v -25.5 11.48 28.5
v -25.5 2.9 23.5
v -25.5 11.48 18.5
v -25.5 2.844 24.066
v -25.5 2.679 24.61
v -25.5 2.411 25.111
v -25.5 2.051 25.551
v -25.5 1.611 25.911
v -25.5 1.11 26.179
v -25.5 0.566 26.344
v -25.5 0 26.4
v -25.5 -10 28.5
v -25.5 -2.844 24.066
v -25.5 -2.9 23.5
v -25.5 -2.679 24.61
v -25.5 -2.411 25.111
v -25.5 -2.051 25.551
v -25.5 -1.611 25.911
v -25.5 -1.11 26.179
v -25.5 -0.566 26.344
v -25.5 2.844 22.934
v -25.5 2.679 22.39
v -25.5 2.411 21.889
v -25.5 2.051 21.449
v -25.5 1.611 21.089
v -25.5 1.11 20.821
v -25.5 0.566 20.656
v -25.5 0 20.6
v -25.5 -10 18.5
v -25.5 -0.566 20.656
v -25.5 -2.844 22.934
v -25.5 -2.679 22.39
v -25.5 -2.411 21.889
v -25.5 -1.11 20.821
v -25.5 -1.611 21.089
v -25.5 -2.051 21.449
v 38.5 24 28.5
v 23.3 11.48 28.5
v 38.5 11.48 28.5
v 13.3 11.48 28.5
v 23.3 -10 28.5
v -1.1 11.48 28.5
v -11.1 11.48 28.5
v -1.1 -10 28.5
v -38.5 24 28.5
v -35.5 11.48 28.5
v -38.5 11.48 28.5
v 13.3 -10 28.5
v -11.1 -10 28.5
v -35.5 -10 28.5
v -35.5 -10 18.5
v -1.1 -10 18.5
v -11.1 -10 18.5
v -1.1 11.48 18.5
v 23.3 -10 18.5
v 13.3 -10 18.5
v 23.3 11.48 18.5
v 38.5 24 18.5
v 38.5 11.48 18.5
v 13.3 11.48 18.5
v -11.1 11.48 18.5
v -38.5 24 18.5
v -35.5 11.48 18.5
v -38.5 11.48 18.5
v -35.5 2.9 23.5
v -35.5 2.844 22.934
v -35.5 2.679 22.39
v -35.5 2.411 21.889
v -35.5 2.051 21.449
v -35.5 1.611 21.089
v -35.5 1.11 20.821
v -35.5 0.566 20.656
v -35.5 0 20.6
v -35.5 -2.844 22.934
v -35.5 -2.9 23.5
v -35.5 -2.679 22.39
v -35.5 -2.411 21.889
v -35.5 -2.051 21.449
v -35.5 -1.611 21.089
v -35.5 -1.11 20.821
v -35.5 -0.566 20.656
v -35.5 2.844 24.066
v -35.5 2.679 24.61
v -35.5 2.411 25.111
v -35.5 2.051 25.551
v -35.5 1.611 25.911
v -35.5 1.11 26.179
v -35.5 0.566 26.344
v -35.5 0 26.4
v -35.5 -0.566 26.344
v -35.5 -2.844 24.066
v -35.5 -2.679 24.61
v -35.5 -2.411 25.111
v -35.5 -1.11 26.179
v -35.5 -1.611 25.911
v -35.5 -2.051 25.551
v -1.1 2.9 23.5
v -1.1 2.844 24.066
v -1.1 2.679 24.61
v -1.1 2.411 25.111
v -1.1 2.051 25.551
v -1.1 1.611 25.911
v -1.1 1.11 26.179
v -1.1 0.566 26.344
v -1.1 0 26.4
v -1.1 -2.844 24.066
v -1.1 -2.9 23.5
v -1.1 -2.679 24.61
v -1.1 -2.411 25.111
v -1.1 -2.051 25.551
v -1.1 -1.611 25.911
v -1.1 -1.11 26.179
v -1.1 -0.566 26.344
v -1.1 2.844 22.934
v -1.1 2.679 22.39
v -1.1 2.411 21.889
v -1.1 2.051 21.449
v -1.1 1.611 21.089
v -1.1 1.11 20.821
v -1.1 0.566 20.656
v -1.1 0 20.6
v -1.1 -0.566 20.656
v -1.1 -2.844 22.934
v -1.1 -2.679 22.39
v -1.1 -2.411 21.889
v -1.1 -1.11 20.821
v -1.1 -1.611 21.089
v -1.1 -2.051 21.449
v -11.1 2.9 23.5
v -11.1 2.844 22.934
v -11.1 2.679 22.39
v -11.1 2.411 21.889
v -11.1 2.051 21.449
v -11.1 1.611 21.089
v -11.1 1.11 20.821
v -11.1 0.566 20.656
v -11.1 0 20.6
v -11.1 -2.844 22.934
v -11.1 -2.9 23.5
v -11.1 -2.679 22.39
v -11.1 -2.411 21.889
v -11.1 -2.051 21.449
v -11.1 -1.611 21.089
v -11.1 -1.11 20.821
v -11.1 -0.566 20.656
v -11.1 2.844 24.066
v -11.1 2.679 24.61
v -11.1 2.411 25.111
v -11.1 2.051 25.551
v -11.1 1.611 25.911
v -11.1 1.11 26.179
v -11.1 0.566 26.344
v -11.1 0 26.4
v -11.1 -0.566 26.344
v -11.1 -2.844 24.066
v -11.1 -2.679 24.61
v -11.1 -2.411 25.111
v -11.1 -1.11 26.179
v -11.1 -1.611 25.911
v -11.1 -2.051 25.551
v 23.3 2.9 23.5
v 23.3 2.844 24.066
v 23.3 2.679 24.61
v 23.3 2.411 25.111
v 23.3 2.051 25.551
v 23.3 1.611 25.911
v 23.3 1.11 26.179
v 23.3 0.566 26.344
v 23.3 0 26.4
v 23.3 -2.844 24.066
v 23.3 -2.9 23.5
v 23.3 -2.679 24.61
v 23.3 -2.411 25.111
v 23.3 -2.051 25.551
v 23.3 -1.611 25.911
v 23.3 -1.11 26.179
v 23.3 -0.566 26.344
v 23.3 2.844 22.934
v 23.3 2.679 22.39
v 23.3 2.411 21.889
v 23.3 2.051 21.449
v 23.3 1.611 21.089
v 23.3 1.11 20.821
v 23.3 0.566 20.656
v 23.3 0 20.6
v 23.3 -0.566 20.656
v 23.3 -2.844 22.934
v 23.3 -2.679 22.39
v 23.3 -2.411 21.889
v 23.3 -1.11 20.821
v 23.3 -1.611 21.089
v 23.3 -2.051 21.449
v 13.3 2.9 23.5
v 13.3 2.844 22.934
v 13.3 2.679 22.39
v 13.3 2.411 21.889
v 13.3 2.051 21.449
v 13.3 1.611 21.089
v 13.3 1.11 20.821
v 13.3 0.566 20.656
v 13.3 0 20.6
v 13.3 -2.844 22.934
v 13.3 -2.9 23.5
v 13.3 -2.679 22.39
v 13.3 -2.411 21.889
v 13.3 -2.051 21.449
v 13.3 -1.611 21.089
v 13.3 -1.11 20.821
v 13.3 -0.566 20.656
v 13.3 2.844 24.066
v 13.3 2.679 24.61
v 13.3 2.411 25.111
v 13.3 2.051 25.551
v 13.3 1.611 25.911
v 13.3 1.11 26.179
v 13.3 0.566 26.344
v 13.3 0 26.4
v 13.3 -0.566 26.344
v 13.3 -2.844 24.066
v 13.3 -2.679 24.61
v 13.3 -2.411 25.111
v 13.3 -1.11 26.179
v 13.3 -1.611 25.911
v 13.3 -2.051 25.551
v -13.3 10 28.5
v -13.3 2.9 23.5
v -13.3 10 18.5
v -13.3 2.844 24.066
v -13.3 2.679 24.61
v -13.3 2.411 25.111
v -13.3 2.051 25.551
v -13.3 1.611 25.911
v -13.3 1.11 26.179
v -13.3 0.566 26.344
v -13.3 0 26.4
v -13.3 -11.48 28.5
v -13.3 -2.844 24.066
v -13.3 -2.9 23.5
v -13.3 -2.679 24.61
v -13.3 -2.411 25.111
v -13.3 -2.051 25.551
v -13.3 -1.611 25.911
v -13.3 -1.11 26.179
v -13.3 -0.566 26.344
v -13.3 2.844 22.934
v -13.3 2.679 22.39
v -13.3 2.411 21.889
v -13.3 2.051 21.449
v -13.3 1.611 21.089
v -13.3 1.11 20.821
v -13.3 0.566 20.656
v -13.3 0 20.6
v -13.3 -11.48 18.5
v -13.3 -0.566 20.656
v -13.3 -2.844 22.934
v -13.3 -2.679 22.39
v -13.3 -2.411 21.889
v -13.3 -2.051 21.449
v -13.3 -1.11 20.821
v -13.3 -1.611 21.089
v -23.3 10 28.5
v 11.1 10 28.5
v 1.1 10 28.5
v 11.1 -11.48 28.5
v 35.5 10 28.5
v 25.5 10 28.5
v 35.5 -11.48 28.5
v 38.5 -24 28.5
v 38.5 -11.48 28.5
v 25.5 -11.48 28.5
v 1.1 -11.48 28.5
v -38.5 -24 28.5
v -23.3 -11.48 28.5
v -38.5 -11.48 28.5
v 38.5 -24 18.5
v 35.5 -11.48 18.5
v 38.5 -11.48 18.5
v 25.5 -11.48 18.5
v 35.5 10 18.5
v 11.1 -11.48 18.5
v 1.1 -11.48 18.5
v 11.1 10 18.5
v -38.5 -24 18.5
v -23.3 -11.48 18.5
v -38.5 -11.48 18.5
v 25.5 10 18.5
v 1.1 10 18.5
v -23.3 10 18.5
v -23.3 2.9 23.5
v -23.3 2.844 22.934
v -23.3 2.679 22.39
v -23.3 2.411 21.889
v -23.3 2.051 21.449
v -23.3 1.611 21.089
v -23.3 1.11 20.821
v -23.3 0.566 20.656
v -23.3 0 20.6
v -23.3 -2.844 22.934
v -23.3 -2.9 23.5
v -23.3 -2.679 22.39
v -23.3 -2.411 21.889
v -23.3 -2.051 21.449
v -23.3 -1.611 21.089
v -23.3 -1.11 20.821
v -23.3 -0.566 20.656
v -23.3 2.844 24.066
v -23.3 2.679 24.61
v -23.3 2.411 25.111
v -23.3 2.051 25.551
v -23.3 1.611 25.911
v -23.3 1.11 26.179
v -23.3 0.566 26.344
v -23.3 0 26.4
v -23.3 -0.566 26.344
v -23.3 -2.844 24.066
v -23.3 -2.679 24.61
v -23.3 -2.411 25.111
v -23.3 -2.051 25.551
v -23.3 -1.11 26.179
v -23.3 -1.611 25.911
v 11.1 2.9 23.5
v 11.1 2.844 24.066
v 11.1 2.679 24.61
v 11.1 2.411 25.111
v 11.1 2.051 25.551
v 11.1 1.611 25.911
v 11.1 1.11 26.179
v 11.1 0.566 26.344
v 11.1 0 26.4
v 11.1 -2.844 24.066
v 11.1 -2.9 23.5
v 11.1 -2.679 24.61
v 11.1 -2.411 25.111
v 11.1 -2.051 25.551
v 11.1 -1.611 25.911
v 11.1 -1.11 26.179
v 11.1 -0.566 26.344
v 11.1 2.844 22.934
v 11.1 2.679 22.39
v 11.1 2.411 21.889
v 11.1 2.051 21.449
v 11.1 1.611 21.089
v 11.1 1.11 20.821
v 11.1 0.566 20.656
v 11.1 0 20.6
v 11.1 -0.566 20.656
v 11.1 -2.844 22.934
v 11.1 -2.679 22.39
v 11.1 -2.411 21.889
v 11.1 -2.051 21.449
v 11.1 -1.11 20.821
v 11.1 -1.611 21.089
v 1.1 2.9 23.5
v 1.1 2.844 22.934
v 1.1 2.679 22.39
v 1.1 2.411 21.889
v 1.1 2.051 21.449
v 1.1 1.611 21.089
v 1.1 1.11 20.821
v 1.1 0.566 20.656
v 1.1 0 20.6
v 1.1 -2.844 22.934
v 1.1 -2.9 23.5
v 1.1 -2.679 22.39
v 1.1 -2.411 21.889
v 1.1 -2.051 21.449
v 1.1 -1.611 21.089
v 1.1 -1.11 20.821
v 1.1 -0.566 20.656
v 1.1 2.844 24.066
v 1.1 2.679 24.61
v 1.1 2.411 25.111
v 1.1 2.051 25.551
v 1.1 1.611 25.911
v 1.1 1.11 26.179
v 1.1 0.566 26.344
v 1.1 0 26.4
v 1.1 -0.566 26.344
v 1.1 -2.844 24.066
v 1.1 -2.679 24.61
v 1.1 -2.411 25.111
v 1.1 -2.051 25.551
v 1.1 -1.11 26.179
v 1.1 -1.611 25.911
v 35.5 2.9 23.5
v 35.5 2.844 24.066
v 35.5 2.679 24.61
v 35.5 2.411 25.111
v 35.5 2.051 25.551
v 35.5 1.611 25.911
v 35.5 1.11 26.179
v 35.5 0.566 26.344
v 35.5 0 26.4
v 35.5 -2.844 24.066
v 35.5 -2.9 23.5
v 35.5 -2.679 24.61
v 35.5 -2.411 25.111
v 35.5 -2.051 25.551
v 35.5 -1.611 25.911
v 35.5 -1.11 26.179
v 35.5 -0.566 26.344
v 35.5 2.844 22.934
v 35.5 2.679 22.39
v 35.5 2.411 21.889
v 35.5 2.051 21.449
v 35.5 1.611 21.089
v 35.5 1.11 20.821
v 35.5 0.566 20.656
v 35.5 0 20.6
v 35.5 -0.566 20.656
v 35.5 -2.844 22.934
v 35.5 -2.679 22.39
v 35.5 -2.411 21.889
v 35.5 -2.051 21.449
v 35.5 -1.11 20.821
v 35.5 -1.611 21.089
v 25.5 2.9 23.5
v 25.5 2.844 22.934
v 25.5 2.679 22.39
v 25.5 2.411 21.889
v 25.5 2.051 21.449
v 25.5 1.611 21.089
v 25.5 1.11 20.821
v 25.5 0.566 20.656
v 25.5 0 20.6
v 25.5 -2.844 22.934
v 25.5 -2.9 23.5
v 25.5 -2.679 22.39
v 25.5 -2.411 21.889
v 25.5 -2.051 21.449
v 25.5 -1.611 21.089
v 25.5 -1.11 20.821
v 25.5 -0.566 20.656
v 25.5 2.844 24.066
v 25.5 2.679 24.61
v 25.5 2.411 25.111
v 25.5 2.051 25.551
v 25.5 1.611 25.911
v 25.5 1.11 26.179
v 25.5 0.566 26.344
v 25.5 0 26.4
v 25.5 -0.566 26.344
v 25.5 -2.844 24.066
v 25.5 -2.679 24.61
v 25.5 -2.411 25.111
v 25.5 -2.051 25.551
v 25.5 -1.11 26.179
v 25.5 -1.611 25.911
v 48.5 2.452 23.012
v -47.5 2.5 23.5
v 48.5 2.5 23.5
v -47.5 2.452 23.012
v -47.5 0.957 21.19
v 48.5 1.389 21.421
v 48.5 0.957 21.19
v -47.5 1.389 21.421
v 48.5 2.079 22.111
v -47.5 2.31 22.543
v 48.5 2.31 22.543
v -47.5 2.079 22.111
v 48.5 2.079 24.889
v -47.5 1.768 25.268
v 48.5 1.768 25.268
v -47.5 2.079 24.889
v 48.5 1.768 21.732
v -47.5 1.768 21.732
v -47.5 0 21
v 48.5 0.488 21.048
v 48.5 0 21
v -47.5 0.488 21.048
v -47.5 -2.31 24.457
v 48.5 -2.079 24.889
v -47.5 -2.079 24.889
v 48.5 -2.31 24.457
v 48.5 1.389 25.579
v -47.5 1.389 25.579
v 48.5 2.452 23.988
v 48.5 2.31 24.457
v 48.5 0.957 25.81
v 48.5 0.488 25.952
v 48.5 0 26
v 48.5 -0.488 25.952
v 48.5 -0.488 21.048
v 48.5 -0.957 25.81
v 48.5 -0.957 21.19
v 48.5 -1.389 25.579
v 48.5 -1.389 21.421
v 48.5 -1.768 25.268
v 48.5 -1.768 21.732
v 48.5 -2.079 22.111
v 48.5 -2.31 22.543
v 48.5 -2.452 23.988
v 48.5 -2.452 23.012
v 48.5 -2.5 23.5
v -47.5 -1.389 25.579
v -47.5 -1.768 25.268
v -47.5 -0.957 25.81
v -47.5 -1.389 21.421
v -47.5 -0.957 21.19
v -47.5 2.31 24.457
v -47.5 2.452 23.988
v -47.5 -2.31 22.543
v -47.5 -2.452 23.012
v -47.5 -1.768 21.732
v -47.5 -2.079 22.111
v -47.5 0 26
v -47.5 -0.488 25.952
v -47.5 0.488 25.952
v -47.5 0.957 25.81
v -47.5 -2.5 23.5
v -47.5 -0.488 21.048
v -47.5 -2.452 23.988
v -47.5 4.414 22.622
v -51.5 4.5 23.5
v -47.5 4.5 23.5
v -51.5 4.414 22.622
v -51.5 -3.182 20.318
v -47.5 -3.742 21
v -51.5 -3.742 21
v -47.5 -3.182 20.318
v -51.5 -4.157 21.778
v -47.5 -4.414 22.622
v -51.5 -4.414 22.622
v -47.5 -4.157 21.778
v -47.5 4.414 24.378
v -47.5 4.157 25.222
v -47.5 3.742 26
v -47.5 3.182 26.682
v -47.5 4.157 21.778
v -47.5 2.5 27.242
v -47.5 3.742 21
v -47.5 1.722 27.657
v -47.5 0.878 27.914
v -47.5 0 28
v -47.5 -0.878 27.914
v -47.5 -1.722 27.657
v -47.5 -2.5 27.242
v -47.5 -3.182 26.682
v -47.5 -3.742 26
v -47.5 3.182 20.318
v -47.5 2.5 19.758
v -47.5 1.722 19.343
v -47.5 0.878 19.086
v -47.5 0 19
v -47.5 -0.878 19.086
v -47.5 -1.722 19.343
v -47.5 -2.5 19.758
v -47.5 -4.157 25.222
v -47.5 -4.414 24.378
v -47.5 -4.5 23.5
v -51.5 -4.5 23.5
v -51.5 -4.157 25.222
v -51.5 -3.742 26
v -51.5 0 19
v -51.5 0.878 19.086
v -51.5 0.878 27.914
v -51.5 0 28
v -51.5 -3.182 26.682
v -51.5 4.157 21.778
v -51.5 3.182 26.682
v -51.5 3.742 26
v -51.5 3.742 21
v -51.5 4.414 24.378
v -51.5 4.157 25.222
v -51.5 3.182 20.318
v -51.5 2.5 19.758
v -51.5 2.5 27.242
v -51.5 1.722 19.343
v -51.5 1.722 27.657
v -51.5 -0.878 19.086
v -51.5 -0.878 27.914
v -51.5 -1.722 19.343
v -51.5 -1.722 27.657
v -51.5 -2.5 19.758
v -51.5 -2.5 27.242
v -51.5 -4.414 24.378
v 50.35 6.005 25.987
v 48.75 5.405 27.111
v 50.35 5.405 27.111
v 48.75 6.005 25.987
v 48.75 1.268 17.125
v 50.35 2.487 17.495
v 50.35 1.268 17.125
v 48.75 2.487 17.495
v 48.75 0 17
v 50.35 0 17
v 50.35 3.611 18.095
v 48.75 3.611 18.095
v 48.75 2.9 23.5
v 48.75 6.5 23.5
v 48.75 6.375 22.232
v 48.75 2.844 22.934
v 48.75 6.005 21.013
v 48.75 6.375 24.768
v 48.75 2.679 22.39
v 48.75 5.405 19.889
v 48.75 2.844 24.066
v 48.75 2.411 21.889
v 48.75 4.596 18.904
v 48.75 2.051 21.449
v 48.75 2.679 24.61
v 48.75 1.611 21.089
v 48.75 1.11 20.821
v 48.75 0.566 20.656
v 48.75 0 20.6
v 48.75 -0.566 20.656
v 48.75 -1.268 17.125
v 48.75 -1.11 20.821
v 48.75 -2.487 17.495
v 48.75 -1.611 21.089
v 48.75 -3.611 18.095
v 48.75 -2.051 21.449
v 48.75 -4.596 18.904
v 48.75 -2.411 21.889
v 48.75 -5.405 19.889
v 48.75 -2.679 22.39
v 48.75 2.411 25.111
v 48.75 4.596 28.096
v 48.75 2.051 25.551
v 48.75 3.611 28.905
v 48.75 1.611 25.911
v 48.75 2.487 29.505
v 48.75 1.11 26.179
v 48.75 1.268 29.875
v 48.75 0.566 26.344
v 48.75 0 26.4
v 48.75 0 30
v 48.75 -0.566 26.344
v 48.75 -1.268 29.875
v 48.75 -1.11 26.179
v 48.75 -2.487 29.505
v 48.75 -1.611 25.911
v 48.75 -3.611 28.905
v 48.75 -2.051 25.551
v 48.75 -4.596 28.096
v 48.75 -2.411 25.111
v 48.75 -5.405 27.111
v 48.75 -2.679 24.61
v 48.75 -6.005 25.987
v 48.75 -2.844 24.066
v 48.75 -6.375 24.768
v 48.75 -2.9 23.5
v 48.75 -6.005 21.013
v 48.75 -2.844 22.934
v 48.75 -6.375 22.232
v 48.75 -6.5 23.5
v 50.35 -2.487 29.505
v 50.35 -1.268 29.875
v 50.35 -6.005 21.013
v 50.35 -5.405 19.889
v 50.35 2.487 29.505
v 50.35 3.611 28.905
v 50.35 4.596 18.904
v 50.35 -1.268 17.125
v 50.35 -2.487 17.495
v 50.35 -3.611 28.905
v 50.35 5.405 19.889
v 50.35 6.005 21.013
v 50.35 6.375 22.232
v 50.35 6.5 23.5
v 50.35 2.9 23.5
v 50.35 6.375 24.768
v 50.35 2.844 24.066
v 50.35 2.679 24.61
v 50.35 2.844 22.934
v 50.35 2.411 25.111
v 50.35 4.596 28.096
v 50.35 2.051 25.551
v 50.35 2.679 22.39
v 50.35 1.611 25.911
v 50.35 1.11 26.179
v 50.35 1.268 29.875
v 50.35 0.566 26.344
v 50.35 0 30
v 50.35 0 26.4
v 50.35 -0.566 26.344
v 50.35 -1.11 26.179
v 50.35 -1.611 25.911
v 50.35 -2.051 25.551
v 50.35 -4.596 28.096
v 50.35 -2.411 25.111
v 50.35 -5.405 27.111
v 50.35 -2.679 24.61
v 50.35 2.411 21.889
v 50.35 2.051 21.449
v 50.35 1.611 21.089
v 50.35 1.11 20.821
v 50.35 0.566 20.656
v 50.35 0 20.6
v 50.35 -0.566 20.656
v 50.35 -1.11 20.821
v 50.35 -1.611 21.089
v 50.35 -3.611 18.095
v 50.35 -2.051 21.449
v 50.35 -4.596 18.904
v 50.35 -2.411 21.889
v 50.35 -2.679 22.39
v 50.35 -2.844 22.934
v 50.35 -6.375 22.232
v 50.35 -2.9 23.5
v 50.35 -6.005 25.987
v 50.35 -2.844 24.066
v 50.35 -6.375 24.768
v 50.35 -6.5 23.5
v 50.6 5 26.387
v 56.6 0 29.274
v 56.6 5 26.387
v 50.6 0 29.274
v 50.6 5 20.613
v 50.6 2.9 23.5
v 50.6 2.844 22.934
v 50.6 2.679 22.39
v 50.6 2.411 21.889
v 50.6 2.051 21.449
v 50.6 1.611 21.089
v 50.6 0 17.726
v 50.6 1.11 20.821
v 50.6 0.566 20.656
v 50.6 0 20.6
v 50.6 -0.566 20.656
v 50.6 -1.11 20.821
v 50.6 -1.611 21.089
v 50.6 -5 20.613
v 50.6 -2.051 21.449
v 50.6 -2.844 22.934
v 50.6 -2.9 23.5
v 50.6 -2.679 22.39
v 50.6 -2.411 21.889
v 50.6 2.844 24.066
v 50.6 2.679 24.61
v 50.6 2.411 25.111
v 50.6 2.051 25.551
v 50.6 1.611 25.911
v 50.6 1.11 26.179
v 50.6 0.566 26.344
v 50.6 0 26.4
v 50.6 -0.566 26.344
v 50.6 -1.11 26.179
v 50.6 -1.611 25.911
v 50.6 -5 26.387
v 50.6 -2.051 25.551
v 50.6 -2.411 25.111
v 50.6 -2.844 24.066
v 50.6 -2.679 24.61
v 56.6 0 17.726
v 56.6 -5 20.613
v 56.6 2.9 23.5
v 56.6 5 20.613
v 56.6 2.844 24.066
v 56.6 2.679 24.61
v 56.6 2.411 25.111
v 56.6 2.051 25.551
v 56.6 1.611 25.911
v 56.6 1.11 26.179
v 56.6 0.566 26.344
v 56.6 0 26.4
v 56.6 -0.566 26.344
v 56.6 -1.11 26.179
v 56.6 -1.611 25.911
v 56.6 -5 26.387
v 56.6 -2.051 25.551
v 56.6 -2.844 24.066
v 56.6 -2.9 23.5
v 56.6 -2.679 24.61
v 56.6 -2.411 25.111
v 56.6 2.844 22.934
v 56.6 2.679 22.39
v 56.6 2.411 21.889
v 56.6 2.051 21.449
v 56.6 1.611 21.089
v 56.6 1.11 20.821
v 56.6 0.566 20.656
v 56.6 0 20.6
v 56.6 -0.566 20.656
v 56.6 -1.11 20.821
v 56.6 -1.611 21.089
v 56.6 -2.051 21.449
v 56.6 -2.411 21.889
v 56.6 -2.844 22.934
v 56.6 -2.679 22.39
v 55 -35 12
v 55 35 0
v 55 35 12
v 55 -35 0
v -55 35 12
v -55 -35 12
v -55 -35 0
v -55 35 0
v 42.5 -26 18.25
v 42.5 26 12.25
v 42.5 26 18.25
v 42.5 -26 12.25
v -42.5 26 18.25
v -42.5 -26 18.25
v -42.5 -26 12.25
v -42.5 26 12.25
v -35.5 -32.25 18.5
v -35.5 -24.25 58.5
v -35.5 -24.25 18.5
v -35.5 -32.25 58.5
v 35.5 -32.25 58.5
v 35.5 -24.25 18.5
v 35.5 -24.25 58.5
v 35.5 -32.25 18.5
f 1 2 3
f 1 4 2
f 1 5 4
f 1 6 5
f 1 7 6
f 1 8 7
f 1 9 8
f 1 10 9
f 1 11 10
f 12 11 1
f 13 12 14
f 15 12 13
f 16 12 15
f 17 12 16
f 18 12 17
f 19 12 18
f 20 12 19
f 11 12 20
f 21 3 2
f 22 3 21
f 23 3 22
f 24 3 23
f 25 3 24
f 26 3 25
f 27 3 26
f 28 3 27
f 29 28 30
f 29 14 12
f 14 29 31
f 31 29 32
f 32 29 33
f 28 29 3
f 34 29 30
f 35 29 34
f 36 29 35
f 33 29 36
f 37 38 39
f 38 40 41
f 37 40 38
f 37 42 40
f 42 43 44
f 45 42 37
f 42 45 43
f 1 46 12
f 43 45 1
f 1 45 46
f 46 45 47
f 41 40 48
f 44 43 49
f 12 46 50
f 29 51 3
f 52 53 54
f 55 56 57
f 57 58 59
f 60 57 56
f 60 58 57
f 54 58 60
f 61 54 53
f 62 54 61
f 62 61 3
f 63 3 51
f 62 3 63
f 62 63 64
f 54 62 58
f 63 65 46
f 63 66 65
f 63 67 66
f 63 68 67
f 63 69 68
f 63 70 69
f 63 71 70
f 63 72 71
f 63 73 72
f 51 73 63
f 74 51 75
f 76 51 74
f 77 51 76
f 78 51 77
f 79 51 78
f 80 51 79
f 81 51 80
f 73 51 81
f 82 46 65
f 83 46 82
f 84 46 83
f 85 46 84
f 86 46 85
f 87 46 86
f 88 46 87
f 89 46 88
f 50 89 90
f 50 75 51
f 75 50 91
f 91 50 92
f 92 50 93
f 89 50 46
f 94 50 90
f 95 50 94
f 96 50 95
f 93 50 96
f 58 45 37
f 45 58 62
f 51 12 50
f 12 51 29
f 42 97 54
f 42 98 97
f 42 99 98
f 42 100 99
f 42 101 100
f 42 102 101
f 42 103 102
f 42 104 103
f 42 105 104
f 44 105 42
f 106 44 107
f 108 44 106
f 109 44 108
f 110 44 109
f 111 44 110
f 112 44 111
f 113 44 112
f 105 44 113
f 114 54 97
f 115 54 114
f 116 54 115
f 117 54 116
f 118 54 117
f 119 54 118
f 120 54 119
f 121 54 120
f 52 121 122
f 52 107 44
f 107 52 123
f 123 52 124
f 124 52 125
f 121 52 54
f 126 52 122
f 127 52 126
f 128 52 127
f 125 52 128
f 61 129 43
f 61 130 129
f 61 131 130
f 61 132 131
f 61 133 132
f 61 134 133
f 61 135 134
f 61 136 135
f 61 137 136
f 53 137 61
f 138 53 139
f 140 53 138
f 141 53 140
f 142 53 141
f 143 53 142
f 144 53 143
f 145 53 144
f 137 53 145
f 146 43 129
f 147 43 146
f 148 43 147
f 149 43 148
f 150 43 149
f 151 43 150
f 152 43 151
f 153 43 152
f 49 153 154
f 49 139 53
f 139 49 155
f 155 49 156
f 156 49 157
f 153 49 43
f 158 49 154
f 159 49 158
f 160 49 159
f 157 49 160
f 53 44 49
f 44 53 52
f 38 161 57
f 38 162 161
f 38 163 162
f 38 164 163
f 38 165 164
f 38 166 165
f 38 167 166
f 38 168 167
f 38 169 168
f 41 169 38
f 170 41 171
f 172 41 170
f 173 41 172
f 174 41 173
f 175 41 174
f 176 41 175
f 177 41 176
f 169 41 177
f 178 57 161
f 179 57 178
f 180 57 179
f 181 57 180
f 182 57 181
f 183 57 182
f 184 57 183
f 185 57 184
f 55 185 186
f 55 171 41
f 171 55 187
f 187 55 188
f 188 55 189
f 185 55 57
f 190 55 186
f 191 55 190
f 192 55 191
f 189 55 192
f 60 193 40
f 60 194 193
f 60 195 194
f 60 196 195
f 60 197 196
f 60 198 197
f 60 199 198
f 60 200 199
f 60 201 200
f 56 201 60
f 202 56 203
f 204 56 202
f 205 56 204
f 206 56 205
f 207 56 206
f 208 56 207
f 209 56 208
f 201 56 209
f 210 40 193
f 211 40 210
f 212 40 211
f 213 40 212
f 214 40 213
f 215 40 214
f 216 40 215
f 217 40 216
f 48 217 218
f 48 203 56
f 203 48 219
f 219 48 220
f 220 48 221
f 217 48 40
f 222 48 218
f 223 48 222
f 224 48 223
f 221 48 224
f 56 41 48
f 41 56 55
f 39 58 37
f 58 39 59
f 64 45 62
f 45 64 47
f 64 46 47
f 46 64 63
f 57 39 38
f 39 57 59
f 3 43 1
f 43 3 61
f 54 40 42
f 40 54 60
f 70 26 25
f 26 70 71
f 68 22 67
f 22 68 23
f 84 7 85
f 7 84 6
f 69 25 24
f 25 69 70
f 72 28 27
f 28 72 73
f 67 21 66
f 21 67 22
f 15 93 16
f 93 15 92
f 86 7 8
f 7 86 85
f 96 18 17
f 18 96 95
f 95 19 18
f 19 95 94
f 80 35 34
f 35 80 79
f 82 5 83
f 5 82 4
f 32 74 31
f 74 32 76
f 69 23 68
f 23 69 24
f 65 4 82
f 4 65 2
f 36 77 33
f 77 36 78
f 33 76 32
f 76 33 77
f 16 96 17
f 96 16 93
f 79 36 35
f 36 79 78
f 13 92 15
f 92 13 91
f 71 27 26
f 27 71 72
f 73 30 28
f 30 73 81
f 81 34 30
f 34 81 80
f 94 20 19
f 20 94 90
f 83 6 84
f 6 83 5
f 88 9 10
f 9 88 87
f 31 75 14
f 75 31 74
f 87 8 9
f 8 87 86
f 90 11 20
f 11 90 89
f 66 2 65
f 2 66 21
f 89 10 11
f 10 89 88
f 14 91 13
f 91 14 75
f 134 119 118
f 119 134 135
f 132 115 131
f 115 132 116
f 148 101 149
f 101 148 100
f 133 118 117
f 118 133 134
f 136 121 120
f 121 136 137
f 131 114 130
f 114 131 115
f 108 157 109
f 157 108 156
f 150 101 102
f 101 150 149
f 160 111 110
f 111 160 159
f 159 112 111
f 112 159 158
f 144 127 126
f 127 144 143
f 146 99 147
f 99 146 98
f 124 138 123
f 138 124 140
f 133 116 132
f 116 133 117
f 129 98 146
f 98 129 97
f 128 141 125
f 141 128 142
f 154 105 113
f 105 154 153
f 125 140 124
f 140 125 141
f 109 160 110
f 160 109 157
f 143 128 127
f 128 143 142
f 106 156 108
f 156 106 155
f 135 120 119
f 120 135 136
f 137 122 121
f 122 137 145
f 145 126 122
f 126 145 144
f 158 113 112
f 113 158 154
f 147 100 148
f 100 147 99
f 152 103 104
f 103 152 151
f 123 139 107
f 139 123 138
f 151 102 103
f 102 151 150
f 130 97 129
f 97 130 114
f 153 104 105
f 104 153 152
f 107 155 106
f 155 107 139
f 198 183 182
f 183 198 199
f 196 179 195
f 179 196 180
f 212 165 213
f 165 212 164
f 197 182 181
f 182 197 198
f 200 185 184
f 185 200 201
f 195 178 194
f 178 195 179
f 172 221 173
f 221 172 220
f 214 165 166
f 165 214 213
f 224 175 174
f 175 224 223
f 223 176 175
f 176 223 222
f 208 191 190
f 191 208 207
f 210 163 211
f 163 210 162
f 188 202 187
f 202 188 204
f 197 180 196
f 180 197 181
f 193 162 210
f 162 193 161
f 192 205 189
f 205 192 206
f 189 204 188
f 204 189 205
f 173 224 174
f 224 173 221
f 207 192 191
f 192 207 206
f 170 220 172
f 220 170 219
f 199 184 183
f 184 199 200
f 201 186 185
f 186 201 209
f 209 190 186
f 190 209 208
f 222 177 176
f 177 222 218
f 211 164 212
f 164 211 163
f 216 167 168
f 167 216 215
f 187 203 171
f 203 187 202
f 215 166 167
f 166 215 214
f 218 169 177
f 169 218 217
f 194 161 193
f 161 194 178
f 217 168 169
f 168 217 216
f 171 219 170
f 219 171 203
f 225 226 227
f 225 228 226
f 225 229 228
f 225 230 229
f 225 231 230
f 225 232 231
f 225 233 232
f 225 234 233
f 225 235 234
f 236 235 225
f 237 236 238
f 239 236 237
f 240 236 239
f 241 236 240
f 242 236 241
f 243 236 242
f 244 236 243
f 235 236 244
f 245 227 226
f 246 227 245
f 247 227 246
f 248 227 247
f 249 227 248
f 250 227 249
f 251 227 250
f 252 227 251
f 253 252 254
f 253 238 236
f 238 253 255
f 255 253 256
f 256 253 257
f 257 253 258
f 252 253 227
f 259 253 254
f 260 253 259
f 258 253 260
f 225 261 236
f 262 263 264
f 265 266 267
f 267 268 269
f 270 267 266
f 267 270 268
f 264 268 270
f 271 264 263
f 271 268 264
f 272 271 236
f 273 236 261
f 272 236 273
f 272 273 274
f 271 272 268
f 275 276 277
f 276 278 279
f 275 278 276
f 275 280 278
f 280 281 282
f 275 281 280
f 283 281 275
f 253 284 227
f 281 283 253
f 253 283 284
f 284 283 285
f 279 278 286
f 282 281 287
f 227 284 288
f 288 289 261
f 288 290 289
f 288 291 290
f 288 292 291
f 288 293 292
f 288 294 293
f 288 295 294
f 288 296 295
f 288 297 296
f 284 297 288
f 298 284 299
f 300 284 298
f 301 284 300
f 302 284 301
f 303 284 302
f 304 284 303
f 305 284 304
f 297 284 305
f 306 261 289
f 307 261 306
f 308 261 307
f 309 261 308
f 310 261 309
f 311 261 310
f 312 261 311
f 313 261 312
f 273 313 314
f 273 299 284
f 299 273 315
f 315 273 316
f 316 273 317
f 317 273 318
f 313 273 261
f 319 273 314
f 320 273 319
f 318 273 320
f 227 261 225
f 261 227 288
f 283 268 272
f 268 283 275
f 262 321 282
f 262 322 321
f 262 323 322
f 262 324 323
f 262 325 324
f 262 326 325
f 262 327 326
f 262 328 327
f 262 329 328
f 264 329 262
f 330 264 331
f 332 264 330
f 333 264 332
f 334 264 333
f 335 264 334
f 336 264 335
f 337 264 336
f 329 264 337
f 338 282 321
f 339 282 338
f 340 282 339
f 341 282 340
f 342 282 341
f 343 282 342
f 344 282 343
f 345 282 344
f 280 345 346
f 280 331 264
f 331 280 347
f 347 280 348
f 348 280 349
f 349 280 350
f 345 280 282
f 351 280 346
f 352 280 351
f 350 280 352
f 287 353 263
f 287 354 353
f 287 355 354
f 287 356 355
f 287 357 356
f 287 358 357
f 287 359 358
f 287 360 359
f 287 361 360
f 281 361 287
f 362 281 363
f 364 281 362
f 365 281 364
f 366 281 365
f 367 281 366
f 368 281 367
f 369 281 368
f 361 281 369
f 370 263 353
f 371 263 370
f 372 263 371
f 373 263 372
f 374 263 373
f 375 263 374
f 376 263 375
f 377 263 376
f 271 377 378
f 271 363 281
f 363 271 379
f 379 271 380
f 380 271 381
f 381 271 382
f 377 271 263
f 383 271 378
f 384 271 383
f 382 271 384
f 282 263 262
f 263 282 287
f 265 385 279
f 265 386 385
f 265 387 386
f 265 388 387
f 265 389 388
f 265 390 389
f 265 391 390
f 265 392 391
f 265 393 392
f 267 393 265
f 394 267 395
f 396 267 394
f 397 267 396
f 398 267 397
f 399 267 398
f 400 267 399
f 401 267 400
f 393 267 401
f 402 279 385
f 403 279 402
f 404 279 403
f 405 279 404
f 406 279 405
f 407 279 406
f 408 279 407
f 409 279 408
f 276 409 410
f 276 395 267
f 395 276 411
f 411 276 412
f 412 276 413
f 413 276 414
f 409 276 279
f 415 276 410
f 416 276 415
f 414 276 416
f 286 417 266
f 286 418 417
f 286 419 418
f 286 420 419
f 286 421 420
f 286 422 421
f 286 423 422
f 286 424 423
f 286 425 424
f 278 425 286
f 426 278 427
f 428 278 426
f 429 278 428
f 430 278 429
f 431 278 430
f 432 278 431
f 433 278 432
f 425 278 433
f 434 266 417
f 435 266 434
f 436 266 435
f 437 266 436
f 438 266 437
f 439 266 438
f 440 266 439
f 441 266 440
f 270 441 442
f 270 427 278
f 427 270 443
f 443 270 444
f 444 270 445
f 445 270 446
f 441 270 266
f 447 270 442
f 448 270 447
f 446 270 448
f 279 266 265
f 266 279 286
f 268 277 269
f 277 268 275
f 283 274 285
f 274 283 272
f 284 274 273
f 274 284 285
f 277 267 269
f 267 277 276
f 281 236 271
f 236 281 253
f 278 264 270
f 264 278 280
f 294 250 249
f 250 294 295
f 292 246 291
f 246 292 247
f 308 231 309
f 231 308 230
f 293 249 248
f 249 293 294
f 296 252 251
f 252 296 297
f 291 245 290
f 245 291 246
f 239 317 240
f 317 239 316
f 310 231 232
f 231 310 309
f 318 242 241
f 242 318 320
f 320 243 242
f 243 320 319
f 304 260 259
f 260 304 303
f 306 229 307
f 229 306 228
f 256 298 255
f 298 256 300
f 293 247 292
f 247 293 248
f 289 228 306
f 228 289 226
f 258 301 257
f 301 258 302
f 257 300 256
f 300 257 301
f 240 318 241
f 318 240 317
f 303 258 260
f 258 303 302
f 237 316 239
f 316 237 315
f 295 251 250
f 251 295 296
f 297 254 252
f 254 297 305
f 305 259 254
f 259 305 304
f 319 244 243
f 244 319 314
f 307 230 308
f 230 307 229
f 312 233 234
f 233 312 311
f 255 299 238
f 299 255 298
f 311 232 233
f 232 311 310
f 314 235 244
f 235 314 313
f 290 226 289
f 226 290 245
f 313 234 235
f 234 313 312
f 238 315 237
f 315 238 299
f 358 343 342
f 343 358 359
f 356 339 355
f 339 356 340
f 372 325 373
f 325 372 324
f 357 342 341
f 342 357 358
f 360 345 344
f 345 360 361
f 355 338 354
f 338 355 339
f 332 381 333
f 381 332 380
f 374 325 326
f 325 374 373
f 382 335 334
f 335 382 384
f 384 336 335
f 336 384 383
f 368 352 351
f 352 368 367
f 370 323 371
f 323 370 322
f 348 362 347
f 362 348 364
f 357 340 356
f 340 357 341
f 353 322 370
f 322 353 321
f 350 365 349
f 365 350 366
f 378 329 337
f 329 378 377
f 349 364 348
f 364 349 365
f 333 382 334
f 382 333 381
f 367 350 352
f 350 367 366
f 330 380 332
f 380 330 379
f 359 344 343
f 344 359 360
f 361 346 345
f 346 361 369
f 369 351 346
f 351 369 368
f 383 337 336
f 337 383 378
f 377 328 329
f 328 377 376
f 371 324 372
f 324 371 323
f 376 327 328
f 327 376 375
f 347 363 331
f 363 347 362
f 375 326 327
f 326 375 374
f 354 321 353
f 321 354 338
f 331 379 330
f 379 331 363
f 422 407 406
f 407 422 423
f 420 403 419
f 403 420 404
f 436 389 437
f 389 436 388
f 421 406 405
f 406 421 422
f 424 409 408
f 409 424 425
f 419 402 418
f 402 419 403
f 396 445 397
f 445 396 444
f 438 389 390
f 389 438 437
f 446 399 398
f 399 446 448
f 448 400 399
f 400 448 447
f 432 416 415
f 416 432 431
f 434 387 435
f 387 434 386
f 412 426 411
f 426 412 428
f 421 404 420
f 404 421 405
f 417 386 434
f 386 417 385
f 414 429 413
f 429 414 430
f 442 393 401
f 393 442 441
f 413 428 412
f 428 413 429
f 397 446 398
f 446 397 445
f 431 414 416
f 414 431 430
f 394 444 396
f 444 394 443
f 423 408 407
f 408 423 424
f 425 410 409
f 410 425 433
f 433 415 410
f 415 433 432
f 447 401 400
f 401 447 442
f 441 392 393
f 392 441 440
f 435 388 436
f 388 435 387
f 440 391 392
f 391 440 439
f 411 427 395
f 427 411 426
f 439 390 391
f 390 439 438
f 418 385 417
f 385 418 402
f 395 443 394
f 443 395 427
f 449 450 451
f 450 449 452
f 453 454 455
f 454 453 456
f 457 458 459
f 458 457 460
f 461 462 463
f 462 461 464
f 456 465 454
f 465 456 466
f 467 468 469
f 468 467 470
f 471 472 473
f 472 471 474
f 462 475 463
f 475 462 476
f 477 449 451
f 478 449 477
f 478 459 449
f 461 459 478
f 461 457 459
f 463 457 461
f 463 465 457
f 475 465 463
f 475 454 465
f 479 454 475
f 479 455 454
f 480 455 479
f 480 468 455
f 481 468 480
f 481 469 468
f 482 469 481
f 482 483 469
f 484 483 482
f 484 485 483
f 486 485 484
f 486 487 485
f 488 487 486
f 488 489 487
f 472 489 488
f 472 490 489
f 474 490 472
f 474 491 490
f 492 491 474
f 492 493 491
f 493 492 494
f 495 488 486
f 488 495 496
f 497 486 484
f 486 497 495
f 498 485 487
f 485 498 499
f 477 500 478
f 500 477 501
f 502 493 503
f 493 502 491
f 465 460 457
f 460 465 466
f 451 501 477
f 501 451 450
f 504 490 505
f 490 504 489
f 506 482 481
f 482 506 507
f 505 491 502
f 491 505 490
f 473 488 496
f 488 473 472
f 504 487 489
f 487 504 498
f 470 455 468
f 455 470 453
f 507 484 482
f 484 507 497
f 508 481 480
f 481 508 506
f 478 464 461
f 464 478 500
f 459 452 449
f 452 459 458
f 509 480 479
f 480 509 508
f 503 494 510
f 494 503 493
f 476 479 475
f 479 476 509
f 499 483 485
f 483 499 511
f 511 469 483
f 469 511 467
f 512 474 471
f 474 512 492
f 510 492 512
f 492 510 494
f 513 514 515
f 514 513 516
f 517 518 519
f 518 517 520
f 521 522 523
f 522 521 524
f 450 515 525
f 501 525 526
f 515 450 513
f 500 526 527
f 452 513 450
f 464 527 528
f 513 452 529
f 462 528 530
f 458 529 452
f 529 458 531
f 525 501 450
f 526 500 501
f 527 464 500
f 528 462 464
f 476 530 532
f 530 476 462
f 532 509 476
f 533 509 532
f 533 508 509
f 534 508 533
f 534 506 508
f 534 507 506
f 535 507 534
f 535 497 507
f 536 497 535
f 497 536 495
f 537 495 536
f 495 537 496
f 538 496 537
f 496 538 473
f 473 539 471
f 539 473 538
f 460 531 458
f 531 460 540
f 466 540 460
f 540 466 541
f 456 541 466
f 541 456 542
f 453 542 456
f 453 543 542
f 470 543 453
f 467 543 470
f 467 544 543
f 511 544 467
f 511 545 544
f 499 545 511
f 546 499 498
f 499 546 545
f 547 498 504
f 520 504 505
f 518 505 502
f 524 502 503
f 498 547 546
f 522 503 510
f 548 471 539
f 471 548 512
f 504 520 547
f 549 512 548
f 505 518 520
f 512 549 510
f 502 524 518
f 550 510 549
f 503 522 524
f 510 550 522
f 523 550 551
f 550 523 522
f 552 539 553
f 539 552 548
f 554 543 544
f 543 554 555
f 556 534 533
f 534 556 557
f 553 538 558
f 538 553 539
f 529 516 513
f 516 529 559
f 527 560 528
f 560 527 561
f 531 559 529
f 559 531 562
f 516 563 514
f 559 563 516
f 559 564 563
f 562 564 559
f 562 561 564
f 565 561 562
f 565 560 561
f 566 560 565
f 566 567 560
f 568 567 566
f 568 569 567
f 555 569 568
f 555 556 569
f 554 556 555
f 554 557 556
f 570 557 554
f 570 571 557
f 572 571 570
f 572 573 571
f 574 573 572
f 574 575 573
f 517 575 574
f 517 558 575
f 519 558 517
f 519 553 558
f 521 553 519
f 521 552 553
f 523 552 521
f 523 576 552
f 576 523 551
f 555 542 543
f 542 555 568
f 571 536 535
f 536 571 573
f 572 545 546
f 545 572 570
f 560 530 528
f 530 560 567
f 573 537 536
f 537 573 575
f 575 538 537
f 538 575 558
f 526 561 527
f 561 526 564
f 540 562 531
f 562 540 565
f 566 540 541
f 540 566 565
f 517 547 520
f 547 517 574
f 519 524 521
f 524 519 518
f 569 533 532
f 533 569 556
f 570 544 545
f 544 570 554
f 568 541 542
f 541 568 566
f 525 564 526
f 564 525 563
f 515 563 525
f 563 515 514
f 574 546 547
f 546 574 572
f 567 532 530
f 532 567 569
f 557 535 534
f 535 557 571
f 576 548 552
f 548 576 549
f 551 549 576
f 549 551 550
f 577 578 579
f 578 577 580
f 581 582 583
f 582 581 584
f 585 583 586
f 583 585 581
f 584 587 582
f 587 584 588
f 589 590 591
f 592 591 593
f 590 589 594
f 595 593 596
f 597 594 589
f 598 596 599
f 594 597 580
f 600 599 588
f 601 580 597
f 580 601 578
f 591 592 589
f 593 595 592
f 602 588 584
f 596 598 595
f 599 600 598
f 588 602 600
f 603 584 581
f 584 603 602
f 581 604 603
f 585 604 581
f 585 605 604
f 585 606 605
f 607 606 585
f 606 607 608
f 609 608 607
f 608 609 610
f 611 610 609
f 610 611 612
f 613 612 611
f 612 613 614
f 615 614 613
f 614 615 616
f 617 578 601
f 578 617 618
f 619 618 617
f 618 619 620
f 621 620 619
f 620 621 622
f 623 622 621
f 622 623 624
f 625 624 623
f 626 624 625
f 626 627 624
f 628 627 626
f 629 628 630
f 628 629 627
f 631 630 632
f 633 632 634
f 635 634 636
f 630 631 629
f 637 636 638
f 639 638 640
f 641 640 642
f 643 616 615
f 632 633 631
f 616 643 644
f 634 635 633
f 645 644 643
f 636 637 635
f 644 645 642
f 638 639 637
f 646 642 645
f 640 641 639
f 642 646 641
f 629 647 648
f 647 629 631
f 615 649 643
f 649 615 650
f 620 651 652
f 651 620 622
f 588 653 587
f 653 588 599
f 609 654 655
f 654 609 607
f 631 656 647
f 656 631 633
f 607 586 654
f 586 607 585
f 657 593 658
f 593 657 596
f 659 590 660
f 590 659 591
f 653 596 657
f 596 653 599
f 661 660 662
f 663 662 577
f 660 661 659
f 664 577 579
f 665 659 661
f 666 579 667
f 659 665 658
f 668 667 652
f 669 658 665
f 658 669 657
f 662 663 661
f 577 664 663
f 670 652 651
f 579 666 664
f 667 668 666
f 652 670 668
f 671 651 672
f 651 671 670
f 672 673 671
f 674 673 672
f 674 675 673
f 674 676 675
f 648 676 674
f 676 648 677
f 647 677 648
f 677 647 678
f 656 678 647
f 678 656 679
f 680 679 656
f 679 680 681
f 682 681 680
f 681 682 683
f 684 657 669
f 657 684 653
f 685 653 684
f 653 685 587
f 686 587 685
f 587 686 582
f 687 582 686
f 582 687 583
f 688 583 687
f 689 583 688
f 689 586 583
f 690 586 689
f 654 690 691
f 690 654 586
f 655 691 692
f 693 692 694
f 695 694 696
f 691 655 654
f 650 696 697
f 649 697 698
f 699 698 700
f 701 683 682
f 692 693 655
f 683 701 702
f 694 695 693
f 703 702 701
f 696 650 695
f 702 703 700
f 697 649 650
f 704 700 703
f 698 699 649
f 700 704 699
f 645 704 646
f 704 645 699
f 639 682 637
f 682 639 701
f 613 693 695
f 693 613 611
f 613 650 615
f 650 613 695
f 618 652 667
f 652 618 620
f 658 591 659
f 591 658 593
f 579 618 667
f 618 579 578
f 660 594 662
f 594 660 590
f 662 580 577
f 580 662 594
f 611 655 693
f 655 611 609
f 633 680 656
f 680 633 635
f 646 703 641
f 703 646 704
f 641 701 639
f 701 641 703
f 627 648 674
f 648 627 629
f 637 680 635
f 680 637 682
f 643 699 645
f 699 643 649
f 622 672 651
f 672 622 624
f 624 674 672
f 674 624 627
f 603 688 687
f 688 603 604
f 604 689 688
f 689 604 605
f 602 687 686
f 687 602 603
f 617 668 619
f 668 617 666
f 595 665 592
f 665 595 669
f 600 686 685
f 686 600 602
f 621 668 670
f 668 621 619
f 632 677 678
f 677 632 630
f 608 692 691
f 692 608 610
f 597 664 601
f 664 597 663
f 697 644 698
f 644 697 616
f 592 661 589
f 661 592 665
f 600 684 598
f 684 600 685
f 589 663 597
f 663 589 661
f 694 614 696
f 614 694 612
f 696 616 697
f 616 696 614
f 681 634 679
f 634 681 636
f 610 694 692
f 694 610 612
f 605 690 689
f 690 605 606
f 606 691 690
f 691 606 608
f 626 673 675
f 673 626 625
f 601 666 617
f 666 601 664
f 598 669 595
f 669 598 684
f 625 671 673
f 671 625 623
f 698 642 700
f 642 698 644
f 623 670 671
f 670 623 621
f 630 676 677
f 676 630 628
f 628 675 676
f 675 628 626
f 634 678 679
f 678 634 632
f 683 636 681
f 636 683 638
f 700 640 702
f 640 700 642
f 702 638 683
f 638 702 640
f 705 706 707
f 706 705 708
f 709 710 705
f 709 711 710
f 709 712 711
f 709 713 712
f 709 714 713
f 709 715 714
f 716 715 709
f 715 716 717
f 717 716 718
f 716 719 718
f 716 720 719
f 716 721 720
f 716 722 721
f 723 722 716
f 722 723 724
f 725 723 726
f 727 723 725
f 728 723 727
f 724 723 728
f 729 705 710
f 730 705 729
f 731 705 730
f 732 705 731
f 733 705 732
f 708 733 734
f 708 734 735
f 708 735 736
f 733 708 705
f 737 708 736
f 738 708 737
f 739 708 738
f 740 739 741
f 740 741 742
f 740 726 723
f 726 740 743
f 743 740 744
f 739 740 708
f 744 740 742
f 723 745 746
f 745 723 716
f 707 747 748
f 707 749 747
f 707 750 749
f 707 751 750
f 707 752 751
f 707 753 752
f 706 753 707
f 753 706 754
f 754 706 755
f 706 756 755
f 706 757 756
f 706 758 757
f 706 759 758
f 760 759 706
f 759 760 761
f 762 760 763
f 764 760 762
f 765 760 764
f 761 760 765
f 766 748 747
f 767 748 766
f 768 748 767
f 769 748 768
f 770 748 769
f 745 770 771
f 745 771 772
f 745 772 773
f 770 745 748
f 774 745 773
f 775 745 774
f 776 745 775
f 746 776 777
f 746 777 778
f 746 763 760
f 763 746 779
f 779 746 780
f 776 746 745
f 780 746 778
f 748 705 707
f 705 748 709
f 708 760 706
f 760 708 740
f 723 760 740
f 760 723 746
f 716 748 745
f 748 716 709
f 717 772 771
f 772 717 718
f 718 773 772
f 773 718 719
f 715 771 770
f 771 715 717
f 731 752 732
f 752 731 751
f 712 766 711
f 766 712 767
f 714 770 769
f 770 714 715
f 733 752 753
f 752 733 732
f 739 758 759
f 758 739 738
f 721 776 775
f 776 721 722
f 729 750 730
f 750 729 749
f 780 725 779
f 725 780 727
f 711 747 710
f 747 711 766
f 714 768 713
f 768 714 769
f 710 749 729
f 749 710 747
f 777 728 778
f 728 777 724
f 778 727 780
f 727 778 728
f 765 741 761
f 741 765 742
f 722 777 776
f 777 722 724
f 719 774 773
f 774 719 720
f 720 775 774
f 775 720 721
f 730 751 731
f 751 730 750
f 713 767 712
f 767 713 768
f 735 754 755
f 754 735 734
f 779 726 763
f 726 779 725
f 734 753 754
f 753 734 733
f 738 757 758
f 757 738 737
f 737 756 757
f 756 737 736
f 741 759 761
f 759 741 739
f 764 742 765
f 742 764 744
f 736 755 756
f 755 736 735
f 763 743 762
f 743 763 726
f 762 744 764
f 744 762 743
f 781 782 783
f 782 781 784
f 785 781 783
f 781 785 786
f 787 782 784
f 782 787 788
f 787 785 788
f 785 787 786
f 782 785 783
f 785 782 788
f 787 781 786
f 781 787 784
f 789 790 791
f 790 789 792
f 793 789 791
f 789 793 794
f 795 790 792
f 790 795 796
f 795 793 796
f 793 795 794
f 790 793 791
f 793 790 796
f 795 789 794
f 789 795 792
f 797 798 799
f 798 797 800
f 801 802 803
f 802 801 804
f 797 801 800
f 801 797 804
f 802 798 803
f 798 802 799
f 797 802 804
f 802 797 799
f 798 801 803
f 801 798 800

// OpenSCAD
$fn = 32;

// ------------------------------------------------------------------------
// Comb hinge with flap: leaf 77 x 24 mm, pin d5, flap 40 mm
// Every part is its own module, assembly() places every instance.
// ------------------------------------------------------------------------

// --- part 1 ---
module hinge_bed() {
  difference() {
    translate([-55, -35, 0]) cube([110, 70, 12]);
  }
}

// --- part 2 ---
module hinge_riser() {
  difference() {
    translate([-42.5, -26, 0]) cube([85, 52, 6]);
  }
}

// --- part 3 ---
module hinge_leaf_a() {
  difference() {
    union() {
      translate([-35.5, -10, -5]) cube([10, 34, 10]);
      translate([-11.1, -10, -5]) cube([10, 34, 10]);
      translate([13.3, -10, -5]) cube([10, 34, 10]);
      translate([-38.5, 11.48, -5]) cube([77, 12.52, 10]);
    }
    translate([-30.5, 0, 0]) rotate([0, 90, 0]) cylinder(h = 12, d = 5.8, center = true);
    translate([-6.1, 0, 0]) rotate([0, 90, 0]) cylinder(h = 12, d = 5.8, center = true);
    translate([18.3, 0, 0]) rotate([0, 90, 0]) cylinder(h = 12, d = 5.8, center = true);
  }
}

// --- part 4 ---
module hinge_leaf_b() {
  difference() {
    union() {
      translate([-23.3, -24, -5]) cube([10, 34, 10]);
      translate([1.1, -24, -5]) cube([10, 34, 10]);
      translate([25.5, -24, -5]) cube([10, 34, 10]);
      translate([-38.5, -24, -5]) cube([77, 12.52, 10]);
    }
    translate([-18.3, 0, 0]) rotate([0, 90, 0]) cylinder(h = 12, d = 5.8, center = true);
    translate([6.1, 0, 0]) rotate([0, 90, 0]) cylinder(h = 12, d = 5.8, center = true);
    translate([30.5, 0, 0]) rotate([0, 90, 0]) cylinder(h = 12, d = 5.8, center = true);
  }
}

// --- part 5 ---
module hinge_flap() {
  difference() {
    translate([-35.5, -20, 0]) cube([71, 40, 8]);
  }
}

// --- part 6 ---
module hinge_pin() {
  rotate([0, 90, 0]) cylinder(h = 97, d = 5, center = true);
  translate([-51.5, 0, 0]) rotate([0, 90, 0]) cylinder(h = 4, d = 9);
}

// --- part 7 ---
module pin_washer() {
  difference() {
      translate([0, 0, 0]) cylinder(h = 1.6, d = 13);
      translate([0, 0, -1]) cylinder(h = 3.6, d = 5.8);
    }
}

// --- part 8 ---
module pin_nut() {
  difference() {
    linear_extrude(height = 6) polygon(points = [[5.774, 0], [2.887, 5], [-2.887, 5], [-5.774, 0], [-2.887, -5], [2.887, -5]]);
    translate([0, 0, -1]) cylinder(h = 8, d = 5.8);
  }
}

// --- assembly ---
module assembly() {
  color([0.80, 0.24, 0.20]) translate([0, 0, 0]) rotate([0, 0, 0]) hinge_bed();
  color([0.20, 0.45, 0.75]) translate([0, 0, 12.25]) rotate([0, 0, 0]) hinge_riser();
  color([0.25, 0.62, 0.32]) translate([0, 0, 23.5]) rotate([0, 0, 0]) hinge_leaf_a();
  color([0.92, 0.70, 0.18]) translate([0, 0, 23.5]) rotate([0, 0, 0]) hinge_leaf_b();
  color([0.58, 0.35, 0.70]) translate([0, -24.25, 38.5]) rotate([90, 0, 0]) hinge_flap();
  color([0.16, 0.66, 0.66]) translate([0, 0, 23.5]) rotate([0, 0, 0]) hinge_pin();
  color([0.85, 0.48, 0.18]) translate([48.75, 0, 23.5]) rotate([0, 90, 0]) pin_washer();
  color([0.55, 0.60, 0.65]) translate([50.6, 0, 23.5]) rotate([0, 90, 0]) pin_nut();
}

assembly();
